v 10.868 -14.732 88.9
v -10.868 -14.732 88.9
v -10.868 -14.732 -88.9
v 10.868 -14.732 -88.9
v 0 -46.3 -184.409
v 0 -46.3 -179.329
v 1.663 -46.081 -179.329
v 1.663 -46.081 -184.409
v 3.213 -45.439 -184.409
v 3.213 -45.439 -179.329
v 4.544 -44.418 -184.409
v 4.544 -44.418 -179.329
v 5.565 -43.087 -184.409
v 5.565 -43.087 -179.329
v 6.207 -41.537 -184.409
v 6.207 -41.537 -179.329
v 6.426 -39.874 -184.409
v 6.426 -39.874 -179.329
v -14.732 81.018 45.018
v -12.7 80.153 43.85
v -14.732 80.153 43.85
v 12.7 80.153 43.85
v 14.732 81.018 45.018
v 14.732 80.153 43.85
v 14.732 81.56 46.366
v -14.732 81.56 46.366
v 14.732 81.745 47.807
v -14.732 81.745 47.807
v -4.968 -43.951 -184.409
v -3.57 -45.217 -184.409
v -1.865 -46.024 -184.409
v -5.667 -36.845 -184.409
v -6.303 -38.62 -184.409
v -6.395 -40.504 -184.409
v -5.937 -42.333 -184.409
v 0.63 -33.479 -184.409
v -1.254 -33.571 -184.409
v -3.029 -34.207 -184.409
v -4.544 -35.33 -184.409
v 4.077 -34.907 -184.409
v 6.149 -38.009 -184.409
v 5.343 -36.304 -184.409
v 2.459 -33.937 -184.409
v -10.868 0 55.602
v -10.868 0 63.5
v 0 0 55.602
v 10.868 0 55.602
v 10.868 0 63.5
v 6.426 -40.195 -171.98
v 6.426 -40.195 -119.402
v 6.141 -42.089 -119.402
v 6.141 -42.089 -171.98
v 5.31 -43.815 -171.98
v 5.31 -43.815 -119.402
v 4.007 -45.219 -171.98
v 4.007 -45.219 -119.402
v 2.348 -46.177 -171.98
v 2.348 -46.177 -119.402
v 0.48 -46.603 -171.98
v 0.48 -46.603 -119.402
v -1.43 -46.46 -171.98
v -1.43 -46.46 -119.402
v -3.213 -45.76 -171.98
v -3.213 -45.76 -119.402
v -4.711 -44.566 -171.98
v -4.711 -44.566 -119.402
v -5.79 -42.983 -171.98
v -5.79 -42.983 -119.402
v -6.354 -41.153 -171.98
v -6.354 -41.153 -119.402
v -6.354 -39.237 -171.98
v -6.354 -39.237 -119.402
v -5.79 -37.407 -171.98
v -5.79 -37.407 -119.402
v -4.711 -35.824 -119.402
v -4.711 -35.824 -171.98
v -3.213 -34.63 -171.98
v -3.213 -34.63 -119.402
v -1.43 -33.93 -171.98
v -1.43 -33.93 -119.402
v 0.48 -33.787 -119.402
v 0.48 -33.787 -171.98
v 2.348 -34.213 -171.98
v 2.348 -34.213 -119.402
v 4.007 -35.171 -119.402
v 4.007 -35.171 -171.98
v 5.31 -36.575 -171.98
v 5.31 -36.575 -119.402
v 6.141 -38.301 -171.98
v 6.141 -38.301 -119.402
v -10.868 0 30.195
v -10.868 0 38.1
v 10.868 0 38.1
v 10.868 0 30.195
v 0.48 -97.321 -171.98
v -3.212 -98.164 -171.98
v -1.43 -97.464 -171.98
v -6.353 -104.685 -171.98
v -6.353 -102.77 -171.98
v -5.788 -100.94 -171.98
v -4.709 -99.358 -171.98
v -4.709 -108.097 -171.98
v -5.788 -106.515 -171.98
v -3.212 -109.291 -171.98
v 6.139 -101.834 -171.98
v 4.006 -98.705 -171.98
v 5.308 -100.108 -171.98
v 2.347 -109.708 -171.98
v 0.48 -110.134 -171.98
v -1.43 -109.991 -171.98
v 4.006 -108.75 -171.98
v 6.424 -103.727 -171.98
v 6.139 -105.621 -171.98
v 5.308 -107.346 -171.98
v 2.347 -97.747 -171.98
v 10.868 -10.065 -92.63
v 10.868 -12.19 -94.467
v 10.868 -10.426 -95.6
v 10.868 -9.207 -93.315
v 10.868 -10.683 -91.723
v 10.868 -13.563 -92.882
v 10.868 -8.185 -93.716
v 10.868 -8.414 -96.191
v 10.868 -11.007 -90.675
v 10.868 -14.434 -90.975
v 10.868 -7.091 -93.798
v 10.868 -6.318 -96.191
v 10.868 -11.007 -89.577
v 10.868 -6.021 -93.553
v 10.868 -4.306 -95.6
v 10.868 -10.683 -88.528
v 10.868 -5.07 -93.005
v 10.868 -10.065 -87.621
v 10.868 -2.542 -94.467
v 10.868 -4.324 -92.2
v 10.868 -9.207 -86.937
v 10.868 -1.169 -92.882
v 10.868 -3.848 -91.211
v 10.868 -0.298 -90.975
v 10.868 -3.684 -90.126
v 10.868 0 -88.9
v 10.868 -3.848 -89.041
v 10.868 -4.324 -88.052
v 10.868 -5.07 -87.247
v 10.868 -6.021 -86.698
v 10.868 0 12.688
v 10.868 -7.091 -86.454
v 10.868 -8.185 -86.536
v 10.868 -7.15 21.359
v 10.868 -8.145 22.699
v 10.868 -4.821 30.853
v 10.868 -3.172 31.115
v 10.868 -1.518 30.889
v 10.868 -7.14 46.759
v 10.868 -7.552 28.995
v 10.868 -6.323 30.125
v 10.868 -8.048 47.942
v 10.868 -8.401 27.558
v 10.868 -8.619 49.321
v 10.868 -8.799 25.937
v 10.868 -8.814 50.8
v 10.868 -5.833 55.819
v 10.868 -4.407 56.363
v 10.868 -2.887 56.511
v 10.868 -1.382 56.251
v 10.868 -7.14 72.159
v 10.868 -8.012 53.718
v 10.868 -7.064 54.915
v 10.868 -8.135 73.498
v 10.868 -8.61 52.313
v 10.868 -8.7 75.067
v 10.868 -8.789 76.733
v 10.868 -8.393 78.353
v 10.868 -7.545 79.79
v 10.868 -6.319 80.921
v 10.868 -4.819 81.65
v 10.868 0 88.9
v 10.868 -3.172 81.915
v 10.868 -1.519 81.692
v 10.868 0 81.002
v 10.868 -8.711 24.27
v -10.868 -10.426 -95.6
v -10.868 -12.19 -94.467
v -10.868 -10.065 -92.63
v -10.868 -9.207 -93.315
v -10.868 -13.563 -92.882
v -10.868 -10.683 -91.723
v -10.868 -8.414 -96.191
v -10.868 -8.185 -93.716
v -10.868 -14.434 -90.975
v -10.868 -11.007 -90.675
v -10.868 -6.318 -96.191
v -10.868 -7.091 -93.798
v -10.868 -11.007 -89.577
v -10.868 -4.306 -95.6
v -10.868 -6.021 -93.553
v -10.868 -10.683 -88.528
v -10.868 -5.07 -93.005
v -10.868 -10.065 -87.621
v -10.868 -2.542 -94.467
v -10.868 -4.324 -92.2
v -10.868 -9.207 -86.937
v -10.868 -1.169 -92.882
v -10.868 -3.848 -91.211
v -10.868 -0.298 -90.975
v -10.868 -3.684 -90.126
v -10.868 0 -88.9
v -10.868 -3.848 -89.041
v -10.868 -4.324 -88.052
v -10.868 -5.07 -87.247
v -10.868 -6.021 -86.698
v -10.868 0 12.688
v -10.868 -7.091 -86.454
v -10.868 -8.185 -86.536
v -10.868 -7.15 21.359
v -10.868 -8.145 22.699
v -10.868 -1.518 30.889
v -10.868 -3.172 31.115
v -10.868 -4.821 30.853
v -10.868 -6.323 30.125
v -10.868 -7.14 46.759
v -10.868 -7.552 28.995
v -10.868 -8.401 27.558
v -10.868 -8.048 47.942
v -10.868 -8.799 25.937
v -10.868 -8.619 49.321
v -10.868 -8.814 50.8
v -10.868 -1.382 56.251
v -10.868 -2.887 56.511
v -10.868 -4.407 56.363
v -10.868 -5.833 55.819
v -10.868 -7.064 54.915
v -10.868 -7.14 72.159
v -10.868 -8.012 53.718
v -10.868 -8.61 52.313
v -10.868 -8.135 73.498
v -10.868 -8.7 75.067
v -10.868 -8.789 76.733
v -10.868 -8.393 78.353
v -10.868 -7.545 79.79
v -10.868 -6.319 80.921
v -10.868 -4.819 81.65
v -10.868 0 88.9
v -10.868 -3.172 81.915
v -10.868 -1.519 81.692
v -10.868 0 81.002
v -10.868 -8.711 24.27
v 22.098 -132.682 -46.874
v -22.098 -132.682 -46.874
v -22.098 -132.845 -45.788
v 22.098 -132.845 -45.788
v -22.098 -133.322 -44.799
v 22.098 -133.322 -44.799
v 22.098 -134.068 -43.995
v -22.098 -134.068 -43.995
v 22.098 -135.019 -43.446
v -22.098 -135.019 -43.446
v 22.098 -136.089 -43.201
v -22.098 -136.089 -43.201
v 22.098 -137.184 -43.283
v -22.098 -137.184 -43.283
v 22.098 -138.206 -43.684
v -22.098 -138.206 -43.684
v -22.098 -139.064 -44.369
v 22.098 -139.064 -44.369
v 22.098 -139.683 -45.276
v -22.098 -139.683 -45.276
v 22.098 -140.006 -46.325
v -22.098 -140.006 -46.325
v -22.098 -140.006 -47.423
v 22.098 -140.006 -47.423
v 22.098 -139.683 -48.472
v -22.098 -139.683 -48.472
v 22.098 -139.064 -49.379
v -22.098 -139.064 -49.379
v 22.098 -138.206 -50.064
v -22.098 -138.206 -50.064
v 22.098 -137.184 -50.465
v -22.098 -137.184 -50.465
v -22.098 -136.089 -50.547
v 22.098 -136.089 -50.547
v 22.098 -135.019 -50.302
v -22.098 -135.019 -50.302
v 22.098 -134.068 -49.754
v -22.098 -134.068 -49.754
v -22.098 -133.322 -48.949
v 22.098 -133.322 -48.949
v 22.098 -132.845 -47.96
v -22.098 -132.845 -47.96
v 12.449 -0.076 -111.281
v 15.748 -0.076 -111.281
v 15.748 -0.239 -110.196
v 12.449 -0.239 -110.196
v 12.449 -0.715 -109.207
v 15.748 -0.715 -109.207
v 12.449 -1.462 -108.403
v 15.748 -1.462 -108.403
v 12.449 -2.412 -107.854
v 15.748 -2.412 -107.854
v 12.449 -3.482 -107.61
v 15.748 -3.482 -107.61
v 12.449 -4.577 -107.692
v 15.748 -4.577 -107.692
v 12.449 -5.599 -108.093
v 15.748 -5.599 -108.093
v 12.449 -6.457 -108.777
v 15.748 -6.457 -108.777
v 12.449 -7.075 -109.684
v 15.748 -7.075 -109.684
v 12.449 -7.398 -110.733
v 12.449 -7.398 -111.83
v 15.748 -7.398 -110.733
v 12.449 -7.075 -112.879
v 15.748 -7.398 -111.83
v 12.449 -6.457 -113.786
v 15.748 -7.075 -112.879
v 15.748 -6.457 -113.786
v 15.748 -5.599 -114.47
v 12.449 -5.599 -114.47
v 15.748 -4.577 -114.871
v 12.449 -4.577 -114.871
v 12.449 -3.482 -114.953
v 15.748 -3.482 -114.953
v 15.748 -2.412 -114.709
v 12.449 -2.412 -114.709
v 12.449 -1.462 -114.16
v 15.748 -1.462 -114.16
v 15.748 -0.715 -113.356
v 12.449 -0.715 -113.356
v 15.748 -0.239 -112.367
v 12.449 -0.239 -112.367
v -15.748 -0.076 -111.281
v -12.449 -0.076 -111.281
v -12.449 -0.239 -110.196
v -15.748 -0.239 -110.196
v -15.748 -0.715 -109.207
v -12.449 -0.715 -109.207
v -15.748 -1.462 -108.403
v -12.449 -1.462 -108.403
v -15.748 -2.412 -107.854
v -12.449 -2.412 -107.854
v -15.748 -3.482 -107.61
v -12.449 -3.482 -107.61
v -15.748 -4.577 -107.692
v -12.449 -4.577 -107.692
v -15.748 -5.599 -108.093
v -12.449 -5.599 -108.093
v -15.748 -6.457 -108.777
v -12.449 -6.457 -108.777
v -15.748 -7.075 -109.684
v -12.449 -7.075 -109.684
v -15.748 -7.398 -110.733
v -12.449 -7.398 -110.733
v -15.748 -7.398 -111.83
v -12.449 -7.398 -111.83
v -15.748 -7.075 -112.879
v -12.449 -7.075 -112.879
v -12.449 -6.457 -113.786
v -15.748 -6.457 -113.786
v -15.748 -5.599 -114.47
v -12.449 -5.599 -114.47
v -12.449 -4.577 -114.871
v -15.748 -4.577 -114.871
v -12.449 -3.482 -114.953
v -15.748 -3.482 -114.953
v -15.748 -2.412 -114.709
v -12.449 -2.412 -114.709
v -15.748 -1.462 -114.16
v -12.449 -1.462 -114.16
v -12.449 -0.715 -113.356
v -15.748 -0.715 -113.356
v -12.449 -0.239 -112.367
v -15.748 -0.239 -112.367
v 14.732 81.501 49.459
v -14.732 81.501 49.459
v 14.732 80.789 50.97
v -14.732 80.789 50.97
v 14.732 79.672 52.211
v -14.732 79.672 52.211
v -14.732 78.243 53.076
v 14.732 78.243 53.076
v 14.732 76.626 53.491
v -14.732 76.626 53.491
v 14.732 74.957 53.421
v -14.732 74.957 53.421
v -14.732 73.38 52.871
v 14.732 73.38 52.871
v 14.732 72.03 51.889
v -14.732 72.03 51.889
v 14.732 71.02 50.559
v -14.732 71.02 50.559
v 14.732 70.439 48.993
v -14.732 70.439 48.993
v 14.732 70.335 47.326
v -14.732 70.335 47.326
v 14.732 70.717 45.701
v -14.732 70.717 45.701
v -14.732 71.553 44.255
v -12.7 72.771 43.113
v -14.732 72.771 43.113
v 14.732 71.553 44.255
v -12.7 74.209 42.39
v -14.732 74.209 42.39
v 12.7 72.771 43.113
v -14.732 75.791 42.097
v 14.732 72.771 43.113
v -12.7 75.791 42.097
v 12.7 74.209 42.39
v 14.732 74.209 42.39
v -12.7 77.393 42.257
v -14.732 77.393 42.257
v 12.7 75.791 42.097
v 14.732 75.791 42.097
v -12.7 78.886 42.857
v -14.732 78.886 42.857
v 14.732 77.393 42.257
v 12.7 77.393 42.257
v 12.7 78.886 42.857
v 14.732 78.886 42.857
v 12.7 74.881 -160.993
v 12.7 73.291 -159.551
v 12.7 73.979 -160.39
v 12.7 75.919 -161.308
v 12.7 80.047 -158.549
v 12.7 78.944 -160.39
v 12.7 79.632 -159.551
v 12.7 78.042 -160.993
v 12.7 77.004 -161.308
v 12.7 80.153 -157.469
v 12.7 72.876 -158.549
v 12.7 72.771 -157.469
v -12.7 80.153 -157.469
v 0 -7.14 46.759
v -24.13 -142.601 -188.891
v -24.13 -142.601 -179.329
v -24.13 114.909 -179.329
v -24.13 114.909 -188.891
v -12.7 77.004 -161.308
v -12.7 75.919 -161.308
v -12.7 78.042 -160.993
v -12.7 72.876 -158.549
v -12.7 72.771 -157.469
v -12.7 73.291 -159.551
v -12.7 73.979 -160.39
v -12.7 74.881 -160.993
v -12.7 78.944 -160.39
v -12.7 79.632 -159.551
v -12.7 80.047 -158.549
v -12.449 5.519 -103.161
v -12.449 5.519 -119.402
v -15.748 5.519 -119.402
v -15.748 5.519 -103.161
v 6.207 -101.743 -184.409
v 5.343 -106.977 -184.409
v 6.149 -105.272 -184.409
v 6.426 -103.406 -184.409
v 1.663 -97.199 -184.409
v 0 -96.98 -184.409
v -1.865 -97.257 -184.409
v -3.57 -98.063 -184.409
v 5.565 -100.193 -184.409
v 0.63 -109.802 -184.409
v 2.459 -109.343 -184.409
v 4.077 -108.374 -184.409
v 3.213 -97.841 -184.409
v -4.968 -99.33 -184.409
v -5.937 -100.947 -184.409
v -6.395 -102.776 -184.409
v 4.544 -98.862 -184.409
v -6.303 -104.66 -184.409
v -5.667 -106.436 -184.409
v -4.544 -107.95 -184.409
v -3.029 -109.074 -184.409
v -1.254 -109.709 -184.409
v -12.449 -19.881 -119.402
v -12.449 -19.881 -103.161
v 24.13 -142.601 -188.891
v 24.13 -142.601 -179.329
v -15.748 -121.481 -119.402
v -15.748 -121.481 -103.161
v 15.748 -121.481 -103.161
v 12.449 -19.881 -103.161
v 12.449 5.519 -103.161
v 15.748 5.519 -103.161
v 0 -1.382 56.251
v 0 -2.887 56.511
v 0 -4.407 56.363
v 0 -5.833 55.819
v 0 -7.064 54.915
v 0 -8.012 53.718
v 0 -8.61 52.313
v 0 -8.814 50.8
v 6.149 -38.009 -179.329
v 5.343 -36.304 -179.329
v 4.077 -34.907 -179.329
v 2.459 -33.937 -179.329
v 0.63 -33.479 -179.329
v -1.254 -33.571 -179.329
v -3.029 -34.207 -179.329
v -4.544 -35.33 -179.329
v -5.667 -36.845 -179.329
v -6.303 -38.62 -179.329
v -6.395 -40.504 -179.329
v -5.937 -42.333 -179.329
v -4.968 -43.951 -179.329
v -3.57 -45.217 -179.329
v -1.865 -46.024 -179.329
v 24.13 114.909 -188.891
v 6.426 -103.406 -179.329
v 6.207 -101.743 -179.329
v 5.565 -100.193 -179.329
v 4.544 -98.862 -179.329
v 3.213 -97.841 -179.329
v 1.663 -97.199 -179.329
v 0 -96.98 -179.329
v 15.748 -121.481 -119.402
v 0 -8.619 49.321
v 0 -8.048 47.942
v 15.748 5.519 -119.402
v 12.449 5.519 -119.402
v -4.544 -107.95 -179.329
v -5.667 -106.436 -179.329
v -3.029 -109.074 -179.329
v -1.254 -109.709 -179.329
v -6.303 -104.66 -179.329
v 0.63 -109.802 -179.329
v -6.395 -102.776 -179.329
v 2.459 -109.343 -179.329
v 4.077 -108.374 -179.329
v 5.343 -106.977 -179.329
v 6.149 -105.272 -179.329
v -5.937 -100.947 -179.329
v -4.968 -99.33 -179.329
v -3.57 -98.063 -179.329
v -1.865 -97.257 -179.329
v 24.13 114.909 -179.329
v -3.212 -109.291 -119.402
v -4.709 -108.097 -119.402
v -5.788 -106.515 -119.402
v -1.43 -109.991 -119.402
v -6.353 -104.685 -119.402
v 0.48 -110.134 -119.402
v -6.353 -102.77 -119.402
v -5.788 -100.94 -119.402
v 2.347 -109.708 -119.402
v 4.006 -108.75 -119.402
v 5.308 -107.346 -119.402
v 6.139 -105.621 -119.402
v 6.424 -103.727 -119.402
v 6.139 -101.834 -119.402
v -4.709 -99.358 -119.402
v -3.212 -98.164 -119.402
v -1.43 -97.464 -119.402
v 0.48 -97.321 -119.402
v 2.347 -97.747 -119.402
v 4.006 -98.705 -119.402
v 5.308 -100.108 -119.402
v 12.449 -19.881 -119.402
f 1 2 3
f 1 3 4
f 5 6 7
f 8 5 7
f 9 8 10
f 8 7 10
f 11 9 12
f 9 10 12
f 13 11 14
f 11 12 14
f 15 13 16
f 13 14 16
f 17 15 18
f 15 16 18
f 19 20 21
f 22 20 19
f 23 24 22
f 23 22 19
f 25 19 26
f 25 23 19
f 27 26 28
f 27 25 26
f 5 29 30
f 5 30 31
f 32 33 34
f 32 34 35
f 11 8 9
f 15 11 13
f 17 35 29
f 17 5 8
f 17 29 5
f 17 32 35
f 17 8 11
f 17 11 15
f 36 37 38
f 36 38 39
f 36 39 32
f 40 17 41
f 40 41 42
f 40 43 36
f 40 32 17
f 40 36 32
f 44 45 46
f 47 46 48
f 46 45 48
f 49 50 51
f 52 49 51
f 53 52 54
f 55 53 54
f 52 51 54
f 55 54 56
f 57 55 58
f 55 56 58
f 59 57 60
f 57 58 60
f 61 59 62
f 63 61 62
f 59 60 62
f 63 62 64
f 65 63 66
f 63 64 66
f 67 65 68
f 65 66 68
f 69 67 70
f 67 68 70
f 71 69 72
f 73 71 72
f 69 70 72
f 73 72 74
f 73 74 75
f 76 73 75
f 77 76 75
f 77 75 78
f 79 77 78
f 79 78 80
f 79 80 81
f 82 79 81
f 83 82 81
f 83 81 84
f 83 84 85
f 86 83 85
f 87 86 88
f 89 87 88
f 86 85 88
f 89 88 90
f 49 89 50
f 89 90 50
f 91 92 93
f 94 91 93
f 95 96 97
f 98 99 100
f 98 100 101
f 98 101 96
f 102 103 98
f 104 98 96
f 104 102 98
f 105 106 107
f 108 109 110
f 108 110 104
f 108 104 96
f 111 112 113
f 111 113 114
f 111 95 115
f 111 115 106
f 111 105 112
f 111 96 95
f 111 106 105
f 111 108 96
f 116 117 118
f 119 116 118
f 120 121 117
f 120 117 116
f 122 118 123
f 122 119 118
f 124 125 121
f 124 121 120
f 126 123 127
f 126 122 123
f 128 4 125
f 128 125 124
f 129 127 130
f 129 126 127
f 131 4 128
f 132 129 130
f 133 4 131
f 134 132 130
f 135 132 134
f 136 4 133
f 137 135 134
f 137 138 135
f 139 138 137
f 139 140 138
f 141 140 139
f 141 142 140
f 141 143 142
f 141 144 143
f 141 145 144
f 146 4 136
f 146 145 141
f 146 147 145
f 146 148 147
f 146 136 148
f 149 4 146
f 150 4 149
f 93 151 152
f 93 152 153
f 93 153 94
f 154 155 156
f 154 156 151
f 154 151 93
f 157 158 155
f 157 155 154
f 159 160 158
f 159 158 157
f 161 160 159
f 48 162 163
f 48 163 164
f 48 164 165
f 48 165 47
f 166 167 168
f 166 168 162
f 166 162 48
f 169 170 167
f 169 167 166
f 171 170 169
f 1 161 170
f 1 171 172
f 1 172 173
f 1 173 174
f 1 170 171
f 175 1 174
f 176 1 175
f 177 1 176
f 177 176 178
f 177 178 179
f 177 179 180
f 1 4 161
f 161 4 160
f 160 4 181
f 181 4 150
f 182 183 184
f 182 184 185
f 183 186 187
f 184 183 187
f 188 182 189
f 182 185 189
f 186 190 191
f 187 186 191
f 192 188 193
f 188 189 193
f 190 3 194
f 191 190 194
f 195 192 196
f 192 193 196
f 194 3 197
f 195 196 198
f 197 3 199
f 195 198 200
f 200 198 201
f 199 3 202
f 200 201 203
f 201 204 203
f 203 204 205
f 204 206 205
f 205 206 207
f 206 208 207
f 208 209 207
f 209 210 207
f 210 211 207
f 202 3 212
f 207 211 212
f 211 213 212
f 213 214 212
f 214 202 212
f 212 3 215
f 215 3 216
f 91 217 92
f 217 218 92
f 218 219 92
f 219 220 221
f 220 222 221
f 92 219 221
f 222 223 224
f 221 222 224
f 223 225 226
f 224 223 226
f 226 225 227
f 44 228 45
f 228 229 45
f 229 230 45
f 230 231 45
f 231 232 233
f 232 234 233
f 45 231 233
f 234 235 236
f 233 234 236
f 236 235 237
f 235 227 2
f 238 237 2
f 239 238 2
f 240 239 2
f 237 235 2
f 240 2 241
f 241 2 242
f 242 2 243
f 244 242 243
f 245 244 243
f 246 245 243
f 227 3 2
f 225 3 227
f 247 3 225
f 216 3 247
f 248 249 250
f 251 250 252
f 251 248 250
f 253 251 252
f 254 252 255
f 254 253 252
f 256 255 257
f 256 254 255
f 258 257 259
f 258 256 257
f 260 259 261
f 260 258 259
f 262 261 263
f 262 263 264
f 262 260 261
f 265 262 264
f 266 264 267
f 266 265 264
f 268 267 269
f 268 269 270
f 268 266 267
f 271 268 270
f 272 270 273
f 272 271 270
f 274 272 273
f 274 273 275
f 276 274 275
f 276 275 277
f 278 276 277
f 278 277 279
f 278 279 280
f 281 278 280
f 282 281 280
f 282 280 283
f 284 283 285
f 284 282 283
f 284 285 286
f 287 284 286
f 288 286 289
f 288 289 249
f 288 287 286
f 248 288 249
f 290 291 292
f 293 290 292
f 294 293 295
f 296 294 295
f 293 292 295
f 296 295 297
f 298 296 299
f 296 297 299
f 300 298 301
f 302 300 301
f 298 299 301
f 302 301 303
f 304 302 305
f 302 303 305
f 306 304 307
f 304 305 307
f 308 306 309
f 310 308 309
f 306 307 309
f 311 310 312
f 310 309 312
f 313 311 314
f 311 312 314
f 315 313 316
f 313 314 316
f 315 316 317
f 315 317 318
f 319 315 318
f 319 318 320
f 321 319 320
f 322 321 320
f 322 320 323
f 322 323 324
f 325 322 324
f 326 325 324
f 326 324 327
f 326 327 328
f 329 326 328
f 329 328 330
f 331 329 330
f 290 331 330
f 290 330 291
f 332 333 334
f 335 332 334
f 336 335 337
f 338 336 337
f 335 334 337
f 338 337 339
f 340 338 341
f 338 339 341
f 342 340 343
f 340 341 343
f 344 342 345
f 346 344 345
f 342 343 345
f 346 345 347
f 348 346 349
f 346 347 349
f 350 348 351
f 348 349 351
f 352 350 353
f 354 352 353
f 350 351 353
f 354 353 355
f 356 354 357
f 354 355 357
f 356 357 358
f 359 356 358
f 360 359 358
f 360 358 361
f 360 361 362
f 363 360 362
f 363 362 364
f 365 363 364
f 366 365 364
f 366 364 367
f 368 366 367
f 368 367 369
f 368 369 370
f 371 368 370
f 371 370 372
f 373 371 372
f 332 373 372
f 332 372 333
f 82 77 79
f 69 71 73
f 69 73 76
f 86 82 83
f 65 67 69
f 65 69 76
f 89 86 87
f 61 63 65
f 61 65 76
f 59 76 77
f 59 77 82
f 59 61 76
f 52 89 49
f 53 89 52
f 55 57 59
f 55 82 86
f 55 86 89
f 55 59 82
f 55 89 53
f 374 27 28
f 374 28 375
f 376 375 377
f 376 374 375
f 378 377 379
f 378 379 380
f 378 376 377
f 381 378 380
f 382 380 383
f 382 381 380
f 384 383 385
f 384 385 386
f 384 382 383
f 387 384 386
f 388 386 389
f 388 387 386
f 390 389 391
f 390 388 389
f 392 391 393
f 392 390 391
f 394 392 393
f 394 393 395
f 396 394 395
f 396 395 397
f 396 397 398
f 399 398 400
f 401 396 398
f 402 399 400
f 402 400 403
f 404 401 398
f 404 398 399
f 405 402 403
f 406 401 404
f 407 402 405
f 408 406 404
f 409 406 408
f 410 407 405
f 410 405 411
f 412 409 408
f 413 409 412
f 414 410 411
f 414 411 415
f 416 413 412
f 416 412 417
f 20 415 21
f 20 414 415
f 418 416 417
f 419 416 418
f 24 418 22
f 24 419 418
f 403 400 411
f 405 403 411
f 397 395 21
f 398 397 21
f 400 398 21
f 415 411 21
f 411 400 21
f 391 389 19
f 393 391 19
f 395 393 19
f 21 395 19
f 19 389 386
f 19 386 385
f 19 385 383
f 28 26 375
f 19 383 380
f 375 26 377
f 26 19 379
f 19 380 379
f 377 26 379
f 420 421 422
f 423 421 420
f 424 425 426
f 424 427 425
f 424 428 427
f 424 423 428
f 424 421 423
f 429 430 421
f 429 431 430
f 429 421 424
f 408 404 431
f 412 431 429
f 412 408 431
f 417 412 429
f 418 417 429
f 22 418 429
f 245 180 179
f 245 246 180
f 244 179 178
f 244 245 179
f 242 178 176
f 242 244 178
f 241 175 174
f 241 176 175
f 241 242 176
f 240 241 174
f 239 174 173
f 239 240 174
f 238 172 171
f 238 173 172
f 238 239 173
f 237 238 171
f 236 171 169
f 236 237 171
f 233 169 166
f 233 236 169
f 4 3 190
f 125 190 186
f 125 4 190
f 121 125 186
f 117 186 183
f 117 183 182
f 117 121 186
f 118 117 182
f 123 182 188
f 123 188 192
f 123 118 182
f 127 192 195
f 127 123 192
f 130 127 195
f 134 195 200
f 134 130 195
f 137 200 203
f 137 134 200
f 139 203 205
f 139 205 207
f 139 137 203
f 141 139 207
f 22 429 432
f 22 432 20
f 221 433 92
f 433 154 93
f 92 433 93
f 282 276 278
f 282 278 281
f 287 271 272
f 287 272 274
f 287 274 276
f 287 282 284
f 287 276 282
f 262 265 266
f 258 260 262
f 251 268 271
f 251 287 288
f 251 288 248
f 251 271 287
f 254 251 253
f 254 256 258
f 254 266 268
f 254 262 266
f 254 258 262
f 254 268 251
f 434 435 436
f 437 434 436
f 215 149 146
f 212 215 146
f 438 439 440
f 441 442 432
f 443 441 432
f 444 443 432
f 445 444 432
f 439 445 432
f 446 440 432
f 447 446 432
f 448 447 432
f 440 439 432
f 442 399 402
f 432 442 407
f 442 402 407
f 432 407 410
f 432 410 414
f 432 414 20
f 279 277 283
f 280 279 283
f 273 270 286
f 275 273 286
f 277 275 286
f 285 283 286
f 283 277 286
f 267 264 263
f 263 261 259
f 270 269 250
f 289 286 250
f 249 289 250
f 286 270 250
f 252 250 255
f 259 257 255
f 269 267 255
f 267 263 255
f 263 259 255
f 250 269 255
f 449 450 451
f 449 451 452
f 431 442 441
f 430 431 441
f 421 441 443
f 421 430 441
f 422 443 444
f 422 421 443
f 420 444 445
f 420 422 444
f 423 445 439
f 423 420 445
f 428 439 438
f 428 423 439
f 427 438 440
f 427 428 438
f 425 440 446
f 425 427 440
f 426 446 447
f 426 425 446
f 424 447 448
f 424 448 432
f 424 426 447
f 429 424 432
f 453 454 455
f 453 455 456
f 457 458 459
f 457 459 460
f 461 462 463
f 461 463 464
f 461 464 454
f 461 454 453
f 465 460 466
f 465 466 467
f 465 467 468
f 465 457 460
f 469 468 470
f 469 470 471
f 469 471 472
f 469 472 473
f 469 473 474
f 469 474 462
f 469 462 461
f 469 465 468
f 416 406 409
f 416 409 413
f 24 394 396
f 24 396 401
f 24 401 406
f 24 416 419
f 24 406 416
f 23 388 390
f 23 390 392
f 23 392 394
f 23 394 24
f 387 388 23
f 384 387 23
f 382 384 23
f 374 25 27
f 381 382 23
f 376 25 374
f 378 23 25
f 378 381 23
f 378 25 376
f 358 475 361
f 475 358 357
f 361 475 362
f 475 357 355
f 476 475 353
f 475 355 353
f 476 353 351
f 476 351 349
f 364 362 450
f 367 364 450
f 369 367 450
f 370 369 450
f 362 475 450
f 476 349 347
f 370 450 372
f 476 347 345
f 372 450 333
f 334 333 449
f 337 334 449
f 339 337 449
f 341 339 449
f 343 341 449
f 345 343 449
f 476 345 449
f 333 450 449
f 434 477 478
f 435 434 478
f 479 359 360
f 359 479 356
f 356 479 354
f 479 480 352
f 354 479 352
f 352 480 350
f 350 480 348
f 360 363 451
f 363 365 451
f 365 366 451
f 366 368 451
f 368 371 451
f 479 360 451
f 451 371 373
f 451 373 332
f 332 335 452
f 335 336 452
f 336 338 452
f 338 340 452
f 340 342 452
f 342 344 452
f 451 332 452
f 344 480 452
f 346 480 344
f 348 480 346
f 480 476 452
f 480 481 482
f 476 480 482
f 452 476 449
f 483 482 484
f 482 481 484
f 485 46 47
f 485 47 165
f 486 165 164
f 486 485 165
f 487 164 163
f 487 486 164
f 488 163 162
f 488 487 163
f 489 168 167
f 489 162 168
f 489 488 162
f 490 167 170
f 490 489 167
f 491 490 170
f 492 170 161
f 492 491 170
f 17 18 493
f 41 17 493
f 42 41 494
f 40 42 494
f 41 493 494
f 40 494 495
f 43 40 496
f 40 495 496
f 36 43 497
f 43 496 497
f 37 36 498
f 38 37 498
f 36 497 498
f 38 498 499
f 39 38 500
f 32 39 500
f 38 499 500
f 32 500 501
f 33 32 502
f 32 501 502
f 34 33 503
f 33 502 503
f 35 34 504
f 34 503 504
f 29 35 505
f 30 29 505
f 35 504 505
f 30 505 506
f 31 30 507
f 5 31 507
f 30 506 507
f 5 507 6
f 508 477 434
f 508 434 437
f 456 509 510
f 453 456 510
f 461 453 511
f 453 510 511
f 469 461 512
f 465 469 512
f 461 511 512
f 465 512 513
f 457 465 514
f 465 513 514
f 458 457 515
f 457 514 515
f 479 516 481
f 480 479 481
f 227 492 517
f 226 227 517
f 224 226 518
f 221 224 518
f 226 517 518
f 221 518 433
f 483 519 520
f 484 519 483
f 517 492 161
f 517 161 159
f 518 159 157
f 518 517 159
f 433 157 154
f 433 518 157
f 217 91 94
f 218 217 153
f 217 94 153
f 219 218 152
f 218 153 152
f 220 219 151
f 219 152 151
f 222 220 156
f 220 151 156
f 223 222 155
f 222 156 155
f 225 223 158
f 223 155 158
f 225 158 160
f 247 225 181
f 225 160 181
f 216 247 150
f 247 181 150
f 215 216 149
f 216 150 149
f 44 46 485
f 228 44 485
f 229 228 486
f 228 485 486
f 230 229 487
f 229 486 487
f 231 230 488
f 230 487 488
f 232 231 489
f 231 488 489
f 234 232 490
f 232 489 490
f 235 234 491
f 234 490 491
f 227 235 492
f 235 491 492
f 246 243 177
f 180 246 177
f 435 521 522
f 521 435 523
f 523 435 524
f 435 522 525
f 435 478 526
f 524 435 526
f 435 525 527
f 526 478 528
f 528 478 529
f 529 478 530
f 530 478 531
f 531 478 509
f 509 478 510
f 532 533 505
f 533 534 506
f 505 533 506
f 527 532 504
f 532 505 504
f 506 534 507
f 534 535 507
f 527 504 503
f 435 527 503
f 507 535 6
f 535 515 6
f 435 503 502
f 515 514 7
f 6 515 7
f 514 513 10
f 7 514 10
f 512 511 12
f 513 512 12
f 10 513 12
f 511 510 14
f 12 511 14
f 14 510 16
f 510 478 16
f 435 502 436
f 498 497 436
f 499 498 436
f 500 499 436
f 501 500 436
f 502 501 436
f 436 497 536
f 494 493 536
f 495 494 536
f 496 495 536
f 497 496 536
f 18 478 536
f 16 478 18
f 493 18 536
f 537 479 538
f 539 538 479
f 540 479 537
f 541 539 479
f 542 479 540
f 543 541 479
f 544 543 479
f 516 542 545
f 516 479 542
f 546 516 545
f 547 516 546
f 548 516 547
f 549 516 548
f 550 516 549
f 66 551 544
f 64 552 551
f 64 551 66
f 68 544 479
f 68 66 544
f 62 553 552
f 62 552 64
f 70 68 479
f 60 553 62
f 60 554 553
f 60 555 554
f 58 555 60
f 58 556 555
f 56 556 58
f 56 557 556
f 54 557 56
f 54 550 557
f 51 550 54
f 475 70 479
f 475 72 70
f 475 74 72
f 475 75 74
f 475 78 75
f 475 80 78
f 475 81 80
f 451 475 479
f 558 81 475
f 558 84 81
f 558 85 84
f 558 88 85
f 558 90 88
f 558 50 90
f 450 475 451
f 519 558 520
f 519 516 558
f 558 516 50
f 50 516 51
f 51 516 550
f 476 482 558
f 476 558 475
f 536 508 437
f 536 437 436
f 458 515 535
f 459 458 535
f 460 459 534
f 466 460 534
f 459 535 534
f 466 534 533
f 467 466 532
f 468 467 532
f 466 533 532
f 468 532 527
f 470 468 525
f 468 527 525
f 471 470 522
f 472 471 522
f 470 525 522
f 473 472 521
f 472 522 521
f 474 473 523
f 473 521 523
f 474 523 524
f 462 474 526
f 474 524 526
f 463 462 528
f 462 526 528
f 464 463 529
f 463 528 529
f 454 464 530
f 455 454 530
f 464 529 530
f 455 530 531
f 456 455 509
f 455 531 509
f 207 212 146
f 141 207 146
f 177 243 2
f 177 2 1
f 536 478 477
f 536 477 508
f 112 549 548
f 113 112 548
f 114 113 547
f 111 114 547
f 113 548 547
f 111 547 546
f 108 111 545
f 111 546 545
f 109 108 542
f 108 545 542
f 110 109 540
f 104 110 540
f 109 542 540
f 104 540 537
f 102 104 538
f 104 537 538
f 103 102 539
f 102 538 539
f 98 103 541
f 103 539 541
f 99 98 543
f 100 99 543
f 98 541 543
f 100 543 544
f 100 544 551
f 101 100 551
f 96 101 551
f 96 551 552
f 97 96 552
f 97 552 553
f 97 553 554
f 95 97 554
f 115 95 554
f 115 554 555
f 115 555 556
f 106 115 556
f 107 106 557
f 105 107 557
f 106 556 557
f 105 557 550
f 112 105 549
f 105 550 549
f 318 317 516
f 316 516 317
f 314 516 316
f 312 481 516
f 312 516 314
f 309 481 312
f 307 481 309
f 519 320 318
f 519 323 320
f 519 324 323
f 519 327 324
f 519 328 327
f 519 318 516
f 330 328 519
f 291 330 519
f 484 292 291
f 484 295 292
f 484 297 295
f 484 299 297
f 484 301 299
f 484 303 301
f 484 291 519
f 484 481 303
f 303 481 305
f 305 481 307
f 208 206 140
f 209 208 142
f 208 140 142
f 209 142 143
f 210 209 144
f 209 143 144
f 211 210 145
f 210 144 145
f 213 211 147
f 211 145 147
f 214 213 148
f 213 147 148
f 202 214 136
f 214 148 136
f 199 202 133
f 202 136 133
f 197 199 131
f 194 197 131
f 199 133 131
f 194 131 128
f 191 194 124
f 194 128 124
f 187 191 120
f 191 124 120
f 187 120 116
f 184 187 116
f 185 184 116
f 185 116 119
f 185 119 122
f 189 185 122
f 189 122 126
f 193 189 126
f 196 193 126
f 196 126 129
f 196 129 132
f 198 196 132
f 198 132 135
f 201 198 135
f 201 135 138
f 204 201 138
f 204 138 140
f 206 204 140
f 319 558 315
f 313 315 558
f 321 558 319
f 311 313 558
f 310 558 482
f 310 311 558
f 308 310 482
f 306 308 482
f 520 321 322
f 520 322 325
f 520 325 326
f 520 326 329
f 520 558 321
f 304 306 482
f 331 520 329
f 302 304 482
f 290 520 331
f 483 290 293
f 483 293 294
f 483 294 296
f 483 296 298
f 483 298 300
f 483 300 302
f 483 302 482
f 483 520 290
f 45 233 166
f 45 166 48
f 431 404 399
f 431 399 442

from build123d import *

# Parameters (mm, degrees)
F0_W      = 21.7364291739
F0_H      = 177.8
F1_DEPTH  = 14.732
F3_DEPTH  = 12.7
F5_DEPTH  = 14.732
F7_DEPTH  = 21.7364291739
F8_W      = 127
F8_H      = 16.2404104558
F9_DEPTH  = 15.748
F10_W     = 24.898827076
F10_H     = 23.6973017454
F11_DEPTH = 25.4
F12_R     = 3.6820181577
F13_DEPTH = 25.4
F14_R     = 3.6820221
F15_DEPTH = 35.6616
F16_R     = 3.683
F17_DEPTH = 22.098
F18_DEPTH = 12.7
F19_W     = 257.5100436807
F19_H     = 9.5616877079
F20_DEPTH = 24.13
F21_R     = 6.4243348959
F21_R_2   = 6.4262
F22_DEPTH = 52.578
F24_DEPTH = 5.08
F25_R     = 3.6957
F26_DEPTH = 25.4


with BuildPart() as f1:
    # F0 (on Front) → F1 (new body)
    with BuildSketch(Plane.XZ):
        Rectangle(F0_W, F0_H)
    extrude(amount=F1_DEPTH)

    # F2 (on Right) → F3 (cut, symmetric)
    with BuildSketch(Plane.YZ):
        with BuildLine():
            Line((-7.1501540619, 21.3588847455), (0, 12.6875869924))
            Line((0, 12.6875869924), (0, 20.6046790833))
            ThreePointArc((0, 20.6046790833), (-3.7085370735, 19.7165303881), (-7.1501540619, 21.3588847455))
        make_face()
        with BuildLine():
            Line((-7.1399152545, 72.158876681), (0, 63.4999919355))
            Line((0, 63.4999919355), (0, 71.3980482082))
            ThreePointArc((0, 71.3980482082), (-3.7043613107, 70.5171651302), (-7.1399152545, 72.158876681))
        make_face()
        with BuildLine():
            Line((0, 71.3980482082), (0, 63.4999919355))
            Line((0, 63.4999919355), (2.1877065946, 74.0288003213))
            ThreePointArc((2.1877065946, 74.0288003213), (1.2953501842, 72.5458615111), (0, 71.3980482082))
        make_face()
        with BuildLine():
            Line((-7.1399152545, 46.758876681), (0, 38.0999959677))
            Line((0, 38.0999959677), (0, 45.9980482082))
            ThreePointArc((0, 45.9980482082), (-3.7043613107, 45.1171651302), (-7.1399152545, 46.758876681))
        make_face()
        with BuildLine():
            Line((0, 45.9980482082), (0, 38.0999959677))
            Line((0, 38.0999959677), (2.1600974907, 48.5627565472))
            ThreePointArc((2.1600974907, 48.5627565472), (1.2723793663, 47.11841402), (0, 45.9980482082))
        make_face()
        with BuildLine():
            Line((0, 20.6046790833), (0, 12.6875869924))
            Line((0, 12.6875869924), (2.1389110751, 23.1372037145))
            ThreePointArc((2.1389110751, 23.1372037145), (1.2571076907, 21.712454779), (0, 20.6046790833))
        make_face()
        with BuildLine():
            ThreePointArc((-7.1501540619, 21.3588847455), (-3.7085370735, 19.7165303881), (0, 20.6046790833))
            Line((0, 20.6046790833), (0, 25.4))
            Line((0, 25.4), (-3.1090388075, 25.4))
            Line((-3.1090388075, 25.4), (-8.8240388075, 25.4))
            ThreePointArc((-8.8240388075, 25.4), (-8.3890103358, 23.212964184), (-7.1501540619, 21.3588847455))
        make_face()
        with BuildLine():
            Line((0, 25.4), (0, 20.6046790833))
            ThreePointArc((0, 20.6046790833), (1.2571076907, 21.712454779), (2.1389110751, 23.1372037145))
            Line((2.1389110751, 23.1372037145), (2.6059302097, 25.4188184178))
            ThreePointArc((2.6059302097, 25.4188184178), (1.9078848069, 28.1370974494), (0, 30.1953209167))
            Line((0, 30.1953209167), (0, 25.4))
        make_face()
        with BuildLine():
            Line((2.6059302097, 25.4188184178), (2.1389110751, 23.1372037145))
            ThreePointArc((2.1389110751, 23.1372037145), (2.4879808718, 24.2447529656), (2.6059611925, 25.4))
            ThreePointArc((2.6059611925, 25.4), (2.6059534468, 25.4094092216), (2.6059302097, 25.4188184178))
        make_face()
        with BuildLine():
            Line((-3.1090388075, 25.4), (0, 25.4))
            Line((0, 25.4), (0, 30.1953209167))
            ThreePointArc((0, 30.1953209167), (-5.837872644, 30.4214231939), (-8.8240388075, 25.4))
            Line((-8.8240388075, 25.4), (-3.1090388075, 25.4))
        make_face()
        with BuildLine():
            ThreePointArc((-7.1399152545, 46.758876681), (-3.7043613107, 45.1171651302), (0, 45.9980482082))
            Line((0, 45.9980482082), (0, 50.7999919355))
            Line((0, 50.7999919355), (-3.0988, 50.7999919355))
            Line((-3.0988, 50.7999919355), (-8.8138, 50.7999919355))
            ThreePointArc((-8.8138, 50.7999919355), (-8.3787715283, 48.6129561195), (-7.1399152545, 46.758876681))
        make_face()
        with BuildLine():
            Line((0, 50.7999919355), (0, 45.9980482082))
            ThreePointArc((0, 45.9980482082), (1.2723793663, 47.11841402), (2.1600974907, 48.5627565472))
            Line((2.1600974907, 48.5627565472), (2.6161295599, 50.7716172016))
            ThreePointArc((2.6161295599, 50.7716172016), (2.6161823899, 50.7858045248), (2.6162, 50.7999919355))
            ThreePointArc((2.6162, 50.7999919355), (1.9197090914, 53.5341813035), (0, 55.6019356628))
            Line((0, 55.6019356628), (0, 50.7999919355))
        make_face()
        with BuildLine():
            Line((2.6161295599, 50.7716172016), (2.1600974907, 48.5627565472))
            ThreePointArc((2.1600974907, 48.5627565472), (2.4981622459, 49.644466679), (2.6161295599, 50.7716172016))
        make_face()
        with BuildLine():
            Line((-3.0988, 50.7999919355), (0, 50.7999919355))
            Line((0, 50.7999919355), (0, 55.6019356628))
            ThreePointArc((0, 55.6019356628), (-5.832989368, 55.8185010268), (-8.8138, 50.7999919355))
            Line((-8.8138, 50.7999919355), (-3.0988, 50.7999919355))
        make_face()
        with BuildLine():
            ThreePointArc((-7.1399152545, 72.158876681), (-3.7043613107, 70.5171651302), (0, 71.3980482082))
            ThreePointArc((0, 71.3980482082), (1.2953501842, 72.5458615111), (2.1877065946, 74.0288003213))
            Line((2.1877065946, 74.0288003213), (2.6150529763, 76.085496671))
            ThreePointArc((2.6150529763, 76.085496671), (2.6159132369, 76.1427414306), (2.6162, 76.1999919355))
            ThreePointArc((2.6162, 76.1999919355), (-5.285835816, 81.4799634638), (-7.1399152545, 72.158876681))
        make_face()
        with BuildLine():
            Line((2.6150529763, 76.085496671), (2.1877065946, 74.0288003213))
            ThreePointArc((2.1877065946, 74.0288003213), (2.4966872568, 75.037345231), (2.6150529763, 76.085496671))
        make_face()
    extrude(amount=F3_DEPTH, both=True, mode=Mode.SUBTRACT)

    # F6 (on face) → F7 (join, through all)
    with BuildSketch(Plane.YZ.offset(10.868214587)):
        with BuildLine():
            ThreePointArc((-14.732, -88.9), (-7.366, -96.266), (0, -88.9))
            Line((0, -88.9), (-14.732, -88.9))
        make_face()
    extrude(amount=-F7_DEPTH)

    # F12 (on face) → F13 (cut)
    with BuildSketch(Plane.YZ.offset(10.868214587)):
        with Locations((-7.366, -90.1258736849)):
            Circle(F12_R)
    extrude(amount=-F13_DEPTH, mode=Mode.SUBTRACT)


with BuildPart() as f5:
    # F4 (on Right) → F5 (new body, symmetric)
    with BuildSketch(Plane.YZ):
        with BuildLine():
            ThreePointArc((80.1528692245, 43.850034868), (81.3317096445, 45.6745766072), (81.7445370543, 47.8072253883))
            ThreePointArc((81.7445370543, 47.8072253883), (73.3803672019, 52.871129425), (72.7705653683, 43.112512559))
            ThreePointArc((72.7705653683, 43.112512559), (76.5976607651, 42.1205338678), (80.1528692245, 43.850034868))
        make_face()
    extrude(amount=F5_DEPTH, both=True)

    # F4 (on Right) → F18 (join, symmetric)
    with BuildSketch(Plane.YZ):
        with BuildLine():
            ThreePointArc((80.1528692245, 43.850034868), (76.5976607651, 42.1205338678), (72.7705653683, 43.112512559))
            Line((72.7705653683, 43.112512559), (72.7705653683, -68.5353949666))
            Line((72.7705653683, -68.5353949666), (72.7705653683, -157.6506513908))
            Line((72.7705653683, -157.6506513908), (72.7716081045, -157.6506518927))
            Line((72.7716081045, -157.6506518927), (80.1528692245, -157.6542048473))
            Line((80.1528692245, -157.6542048473), (80.1528692245, -68.5353949666))
            Line((80.1528692245, -68.5353949666), (80.1528692245, 43.850034868))
        make_face()
    extrude(amount=F18_DEPTH, both=True)

    # F25 (on face) → F26 (join)
    with BuildSketch(Plane.YZ.offset(12.7)):
        with Locations((76.4617172964, -157.652428119)):
            Circle(F25_R)
    extrude(amount=-F26_DEPTH)


with BuildPart() as f9:
    # F8 (on Right) → F9 (new body, symmetric)
    with BuildSketch(Plane.YZ):
        with Locations((-57.981248945, -111.2814545631)):
            Rectangle(F8_W, F8_H)
    extrude(amount=F9_DEPTH, both=True)

    # F10 (on face) → F11 (cut)
    with BuildSketch(Plane(origin=(0, 5.518751055, 0), x_dir=(-1, 0, 0), z_dir=(0, 1, 0))):
        with Locations((0, -111.3843470812)):
            Rectangle(F10_W, F10_H)
    extrude(amount=-F11_DEPTH, mode=Mode.SUBTRACT)

    # F14 (on face) → F15 (cut)
    with BuildSketch(Plane.YZ.offset(15.748)):
        with Locations((-3.7575557362, -111.2814545631)):
            Circle(F14_R)
    extrude(amount=-F15_DEPTH, mode=Mode.SUBTRACT)

    # F21 (on face) → F22 (join)
    with BuildSketch(Plane(origin=(0, 0, -119.4016597911), x_dir=(1, 0, 0), z_dir=(0, 0, -1))):
        with Locations((0, 103.7273257971)):
            Circle(F21_R)
        with Locations((0, 40.1950962842)):
            Circle(F21_R_2)
    extrude(amount=F22_DEPTH)


with BuildPart() as f17:
    # F16 (on Right) → F17 (new body, symmetric)
    with BuildSketch(Plane.YZ):
        with Locations((-136.3645493984, -46.8740426004)):
            Circle(F16_R)
    extrude(amount=F17_DEPTH, both=True)


with BuildPart() as f20:
    # F19 (on Right) → F20 (new body, symmetric)
    with BuildSketch(Plane.YZ):
        with Locations((-13.8460956514, -184.1097325087)):
            Rectangle(F19_W, F19_H)
    extrude(amount=F20_DEPTH, both=True)

    # F23 (on face) → F24 (cut)
    with BuildSketch(Plane.XY.offset(-179.3288886547)):
        with BuildLine():
            ThreePointArc((0, -96.9800951803), (-4.5440095973, -107.9503047776), (6.4262, -103.4062951803))
            ThreePointArc((6.4262, -103.4062951803), (4.5440095973, -98.8622855831), (0, -96.9800951803))
        make_face()
        with BuildLine():
            ThreePointArc((6.4262, -39.8740625803), (-4.5440095973, -35.3300529831), (0, -46.3002625803))
            ThreePointArc((0, -46.3002625803), (4.5440095973, -44.4180721776), (6.4262, -39.8740625803))
        make_face()
    extrude(amount=-F24_DEPTH, mode=Mode.SUBTRACT)


solid = Compound([f1.part, f5.part, f9.part, f17.part, f20.part])
